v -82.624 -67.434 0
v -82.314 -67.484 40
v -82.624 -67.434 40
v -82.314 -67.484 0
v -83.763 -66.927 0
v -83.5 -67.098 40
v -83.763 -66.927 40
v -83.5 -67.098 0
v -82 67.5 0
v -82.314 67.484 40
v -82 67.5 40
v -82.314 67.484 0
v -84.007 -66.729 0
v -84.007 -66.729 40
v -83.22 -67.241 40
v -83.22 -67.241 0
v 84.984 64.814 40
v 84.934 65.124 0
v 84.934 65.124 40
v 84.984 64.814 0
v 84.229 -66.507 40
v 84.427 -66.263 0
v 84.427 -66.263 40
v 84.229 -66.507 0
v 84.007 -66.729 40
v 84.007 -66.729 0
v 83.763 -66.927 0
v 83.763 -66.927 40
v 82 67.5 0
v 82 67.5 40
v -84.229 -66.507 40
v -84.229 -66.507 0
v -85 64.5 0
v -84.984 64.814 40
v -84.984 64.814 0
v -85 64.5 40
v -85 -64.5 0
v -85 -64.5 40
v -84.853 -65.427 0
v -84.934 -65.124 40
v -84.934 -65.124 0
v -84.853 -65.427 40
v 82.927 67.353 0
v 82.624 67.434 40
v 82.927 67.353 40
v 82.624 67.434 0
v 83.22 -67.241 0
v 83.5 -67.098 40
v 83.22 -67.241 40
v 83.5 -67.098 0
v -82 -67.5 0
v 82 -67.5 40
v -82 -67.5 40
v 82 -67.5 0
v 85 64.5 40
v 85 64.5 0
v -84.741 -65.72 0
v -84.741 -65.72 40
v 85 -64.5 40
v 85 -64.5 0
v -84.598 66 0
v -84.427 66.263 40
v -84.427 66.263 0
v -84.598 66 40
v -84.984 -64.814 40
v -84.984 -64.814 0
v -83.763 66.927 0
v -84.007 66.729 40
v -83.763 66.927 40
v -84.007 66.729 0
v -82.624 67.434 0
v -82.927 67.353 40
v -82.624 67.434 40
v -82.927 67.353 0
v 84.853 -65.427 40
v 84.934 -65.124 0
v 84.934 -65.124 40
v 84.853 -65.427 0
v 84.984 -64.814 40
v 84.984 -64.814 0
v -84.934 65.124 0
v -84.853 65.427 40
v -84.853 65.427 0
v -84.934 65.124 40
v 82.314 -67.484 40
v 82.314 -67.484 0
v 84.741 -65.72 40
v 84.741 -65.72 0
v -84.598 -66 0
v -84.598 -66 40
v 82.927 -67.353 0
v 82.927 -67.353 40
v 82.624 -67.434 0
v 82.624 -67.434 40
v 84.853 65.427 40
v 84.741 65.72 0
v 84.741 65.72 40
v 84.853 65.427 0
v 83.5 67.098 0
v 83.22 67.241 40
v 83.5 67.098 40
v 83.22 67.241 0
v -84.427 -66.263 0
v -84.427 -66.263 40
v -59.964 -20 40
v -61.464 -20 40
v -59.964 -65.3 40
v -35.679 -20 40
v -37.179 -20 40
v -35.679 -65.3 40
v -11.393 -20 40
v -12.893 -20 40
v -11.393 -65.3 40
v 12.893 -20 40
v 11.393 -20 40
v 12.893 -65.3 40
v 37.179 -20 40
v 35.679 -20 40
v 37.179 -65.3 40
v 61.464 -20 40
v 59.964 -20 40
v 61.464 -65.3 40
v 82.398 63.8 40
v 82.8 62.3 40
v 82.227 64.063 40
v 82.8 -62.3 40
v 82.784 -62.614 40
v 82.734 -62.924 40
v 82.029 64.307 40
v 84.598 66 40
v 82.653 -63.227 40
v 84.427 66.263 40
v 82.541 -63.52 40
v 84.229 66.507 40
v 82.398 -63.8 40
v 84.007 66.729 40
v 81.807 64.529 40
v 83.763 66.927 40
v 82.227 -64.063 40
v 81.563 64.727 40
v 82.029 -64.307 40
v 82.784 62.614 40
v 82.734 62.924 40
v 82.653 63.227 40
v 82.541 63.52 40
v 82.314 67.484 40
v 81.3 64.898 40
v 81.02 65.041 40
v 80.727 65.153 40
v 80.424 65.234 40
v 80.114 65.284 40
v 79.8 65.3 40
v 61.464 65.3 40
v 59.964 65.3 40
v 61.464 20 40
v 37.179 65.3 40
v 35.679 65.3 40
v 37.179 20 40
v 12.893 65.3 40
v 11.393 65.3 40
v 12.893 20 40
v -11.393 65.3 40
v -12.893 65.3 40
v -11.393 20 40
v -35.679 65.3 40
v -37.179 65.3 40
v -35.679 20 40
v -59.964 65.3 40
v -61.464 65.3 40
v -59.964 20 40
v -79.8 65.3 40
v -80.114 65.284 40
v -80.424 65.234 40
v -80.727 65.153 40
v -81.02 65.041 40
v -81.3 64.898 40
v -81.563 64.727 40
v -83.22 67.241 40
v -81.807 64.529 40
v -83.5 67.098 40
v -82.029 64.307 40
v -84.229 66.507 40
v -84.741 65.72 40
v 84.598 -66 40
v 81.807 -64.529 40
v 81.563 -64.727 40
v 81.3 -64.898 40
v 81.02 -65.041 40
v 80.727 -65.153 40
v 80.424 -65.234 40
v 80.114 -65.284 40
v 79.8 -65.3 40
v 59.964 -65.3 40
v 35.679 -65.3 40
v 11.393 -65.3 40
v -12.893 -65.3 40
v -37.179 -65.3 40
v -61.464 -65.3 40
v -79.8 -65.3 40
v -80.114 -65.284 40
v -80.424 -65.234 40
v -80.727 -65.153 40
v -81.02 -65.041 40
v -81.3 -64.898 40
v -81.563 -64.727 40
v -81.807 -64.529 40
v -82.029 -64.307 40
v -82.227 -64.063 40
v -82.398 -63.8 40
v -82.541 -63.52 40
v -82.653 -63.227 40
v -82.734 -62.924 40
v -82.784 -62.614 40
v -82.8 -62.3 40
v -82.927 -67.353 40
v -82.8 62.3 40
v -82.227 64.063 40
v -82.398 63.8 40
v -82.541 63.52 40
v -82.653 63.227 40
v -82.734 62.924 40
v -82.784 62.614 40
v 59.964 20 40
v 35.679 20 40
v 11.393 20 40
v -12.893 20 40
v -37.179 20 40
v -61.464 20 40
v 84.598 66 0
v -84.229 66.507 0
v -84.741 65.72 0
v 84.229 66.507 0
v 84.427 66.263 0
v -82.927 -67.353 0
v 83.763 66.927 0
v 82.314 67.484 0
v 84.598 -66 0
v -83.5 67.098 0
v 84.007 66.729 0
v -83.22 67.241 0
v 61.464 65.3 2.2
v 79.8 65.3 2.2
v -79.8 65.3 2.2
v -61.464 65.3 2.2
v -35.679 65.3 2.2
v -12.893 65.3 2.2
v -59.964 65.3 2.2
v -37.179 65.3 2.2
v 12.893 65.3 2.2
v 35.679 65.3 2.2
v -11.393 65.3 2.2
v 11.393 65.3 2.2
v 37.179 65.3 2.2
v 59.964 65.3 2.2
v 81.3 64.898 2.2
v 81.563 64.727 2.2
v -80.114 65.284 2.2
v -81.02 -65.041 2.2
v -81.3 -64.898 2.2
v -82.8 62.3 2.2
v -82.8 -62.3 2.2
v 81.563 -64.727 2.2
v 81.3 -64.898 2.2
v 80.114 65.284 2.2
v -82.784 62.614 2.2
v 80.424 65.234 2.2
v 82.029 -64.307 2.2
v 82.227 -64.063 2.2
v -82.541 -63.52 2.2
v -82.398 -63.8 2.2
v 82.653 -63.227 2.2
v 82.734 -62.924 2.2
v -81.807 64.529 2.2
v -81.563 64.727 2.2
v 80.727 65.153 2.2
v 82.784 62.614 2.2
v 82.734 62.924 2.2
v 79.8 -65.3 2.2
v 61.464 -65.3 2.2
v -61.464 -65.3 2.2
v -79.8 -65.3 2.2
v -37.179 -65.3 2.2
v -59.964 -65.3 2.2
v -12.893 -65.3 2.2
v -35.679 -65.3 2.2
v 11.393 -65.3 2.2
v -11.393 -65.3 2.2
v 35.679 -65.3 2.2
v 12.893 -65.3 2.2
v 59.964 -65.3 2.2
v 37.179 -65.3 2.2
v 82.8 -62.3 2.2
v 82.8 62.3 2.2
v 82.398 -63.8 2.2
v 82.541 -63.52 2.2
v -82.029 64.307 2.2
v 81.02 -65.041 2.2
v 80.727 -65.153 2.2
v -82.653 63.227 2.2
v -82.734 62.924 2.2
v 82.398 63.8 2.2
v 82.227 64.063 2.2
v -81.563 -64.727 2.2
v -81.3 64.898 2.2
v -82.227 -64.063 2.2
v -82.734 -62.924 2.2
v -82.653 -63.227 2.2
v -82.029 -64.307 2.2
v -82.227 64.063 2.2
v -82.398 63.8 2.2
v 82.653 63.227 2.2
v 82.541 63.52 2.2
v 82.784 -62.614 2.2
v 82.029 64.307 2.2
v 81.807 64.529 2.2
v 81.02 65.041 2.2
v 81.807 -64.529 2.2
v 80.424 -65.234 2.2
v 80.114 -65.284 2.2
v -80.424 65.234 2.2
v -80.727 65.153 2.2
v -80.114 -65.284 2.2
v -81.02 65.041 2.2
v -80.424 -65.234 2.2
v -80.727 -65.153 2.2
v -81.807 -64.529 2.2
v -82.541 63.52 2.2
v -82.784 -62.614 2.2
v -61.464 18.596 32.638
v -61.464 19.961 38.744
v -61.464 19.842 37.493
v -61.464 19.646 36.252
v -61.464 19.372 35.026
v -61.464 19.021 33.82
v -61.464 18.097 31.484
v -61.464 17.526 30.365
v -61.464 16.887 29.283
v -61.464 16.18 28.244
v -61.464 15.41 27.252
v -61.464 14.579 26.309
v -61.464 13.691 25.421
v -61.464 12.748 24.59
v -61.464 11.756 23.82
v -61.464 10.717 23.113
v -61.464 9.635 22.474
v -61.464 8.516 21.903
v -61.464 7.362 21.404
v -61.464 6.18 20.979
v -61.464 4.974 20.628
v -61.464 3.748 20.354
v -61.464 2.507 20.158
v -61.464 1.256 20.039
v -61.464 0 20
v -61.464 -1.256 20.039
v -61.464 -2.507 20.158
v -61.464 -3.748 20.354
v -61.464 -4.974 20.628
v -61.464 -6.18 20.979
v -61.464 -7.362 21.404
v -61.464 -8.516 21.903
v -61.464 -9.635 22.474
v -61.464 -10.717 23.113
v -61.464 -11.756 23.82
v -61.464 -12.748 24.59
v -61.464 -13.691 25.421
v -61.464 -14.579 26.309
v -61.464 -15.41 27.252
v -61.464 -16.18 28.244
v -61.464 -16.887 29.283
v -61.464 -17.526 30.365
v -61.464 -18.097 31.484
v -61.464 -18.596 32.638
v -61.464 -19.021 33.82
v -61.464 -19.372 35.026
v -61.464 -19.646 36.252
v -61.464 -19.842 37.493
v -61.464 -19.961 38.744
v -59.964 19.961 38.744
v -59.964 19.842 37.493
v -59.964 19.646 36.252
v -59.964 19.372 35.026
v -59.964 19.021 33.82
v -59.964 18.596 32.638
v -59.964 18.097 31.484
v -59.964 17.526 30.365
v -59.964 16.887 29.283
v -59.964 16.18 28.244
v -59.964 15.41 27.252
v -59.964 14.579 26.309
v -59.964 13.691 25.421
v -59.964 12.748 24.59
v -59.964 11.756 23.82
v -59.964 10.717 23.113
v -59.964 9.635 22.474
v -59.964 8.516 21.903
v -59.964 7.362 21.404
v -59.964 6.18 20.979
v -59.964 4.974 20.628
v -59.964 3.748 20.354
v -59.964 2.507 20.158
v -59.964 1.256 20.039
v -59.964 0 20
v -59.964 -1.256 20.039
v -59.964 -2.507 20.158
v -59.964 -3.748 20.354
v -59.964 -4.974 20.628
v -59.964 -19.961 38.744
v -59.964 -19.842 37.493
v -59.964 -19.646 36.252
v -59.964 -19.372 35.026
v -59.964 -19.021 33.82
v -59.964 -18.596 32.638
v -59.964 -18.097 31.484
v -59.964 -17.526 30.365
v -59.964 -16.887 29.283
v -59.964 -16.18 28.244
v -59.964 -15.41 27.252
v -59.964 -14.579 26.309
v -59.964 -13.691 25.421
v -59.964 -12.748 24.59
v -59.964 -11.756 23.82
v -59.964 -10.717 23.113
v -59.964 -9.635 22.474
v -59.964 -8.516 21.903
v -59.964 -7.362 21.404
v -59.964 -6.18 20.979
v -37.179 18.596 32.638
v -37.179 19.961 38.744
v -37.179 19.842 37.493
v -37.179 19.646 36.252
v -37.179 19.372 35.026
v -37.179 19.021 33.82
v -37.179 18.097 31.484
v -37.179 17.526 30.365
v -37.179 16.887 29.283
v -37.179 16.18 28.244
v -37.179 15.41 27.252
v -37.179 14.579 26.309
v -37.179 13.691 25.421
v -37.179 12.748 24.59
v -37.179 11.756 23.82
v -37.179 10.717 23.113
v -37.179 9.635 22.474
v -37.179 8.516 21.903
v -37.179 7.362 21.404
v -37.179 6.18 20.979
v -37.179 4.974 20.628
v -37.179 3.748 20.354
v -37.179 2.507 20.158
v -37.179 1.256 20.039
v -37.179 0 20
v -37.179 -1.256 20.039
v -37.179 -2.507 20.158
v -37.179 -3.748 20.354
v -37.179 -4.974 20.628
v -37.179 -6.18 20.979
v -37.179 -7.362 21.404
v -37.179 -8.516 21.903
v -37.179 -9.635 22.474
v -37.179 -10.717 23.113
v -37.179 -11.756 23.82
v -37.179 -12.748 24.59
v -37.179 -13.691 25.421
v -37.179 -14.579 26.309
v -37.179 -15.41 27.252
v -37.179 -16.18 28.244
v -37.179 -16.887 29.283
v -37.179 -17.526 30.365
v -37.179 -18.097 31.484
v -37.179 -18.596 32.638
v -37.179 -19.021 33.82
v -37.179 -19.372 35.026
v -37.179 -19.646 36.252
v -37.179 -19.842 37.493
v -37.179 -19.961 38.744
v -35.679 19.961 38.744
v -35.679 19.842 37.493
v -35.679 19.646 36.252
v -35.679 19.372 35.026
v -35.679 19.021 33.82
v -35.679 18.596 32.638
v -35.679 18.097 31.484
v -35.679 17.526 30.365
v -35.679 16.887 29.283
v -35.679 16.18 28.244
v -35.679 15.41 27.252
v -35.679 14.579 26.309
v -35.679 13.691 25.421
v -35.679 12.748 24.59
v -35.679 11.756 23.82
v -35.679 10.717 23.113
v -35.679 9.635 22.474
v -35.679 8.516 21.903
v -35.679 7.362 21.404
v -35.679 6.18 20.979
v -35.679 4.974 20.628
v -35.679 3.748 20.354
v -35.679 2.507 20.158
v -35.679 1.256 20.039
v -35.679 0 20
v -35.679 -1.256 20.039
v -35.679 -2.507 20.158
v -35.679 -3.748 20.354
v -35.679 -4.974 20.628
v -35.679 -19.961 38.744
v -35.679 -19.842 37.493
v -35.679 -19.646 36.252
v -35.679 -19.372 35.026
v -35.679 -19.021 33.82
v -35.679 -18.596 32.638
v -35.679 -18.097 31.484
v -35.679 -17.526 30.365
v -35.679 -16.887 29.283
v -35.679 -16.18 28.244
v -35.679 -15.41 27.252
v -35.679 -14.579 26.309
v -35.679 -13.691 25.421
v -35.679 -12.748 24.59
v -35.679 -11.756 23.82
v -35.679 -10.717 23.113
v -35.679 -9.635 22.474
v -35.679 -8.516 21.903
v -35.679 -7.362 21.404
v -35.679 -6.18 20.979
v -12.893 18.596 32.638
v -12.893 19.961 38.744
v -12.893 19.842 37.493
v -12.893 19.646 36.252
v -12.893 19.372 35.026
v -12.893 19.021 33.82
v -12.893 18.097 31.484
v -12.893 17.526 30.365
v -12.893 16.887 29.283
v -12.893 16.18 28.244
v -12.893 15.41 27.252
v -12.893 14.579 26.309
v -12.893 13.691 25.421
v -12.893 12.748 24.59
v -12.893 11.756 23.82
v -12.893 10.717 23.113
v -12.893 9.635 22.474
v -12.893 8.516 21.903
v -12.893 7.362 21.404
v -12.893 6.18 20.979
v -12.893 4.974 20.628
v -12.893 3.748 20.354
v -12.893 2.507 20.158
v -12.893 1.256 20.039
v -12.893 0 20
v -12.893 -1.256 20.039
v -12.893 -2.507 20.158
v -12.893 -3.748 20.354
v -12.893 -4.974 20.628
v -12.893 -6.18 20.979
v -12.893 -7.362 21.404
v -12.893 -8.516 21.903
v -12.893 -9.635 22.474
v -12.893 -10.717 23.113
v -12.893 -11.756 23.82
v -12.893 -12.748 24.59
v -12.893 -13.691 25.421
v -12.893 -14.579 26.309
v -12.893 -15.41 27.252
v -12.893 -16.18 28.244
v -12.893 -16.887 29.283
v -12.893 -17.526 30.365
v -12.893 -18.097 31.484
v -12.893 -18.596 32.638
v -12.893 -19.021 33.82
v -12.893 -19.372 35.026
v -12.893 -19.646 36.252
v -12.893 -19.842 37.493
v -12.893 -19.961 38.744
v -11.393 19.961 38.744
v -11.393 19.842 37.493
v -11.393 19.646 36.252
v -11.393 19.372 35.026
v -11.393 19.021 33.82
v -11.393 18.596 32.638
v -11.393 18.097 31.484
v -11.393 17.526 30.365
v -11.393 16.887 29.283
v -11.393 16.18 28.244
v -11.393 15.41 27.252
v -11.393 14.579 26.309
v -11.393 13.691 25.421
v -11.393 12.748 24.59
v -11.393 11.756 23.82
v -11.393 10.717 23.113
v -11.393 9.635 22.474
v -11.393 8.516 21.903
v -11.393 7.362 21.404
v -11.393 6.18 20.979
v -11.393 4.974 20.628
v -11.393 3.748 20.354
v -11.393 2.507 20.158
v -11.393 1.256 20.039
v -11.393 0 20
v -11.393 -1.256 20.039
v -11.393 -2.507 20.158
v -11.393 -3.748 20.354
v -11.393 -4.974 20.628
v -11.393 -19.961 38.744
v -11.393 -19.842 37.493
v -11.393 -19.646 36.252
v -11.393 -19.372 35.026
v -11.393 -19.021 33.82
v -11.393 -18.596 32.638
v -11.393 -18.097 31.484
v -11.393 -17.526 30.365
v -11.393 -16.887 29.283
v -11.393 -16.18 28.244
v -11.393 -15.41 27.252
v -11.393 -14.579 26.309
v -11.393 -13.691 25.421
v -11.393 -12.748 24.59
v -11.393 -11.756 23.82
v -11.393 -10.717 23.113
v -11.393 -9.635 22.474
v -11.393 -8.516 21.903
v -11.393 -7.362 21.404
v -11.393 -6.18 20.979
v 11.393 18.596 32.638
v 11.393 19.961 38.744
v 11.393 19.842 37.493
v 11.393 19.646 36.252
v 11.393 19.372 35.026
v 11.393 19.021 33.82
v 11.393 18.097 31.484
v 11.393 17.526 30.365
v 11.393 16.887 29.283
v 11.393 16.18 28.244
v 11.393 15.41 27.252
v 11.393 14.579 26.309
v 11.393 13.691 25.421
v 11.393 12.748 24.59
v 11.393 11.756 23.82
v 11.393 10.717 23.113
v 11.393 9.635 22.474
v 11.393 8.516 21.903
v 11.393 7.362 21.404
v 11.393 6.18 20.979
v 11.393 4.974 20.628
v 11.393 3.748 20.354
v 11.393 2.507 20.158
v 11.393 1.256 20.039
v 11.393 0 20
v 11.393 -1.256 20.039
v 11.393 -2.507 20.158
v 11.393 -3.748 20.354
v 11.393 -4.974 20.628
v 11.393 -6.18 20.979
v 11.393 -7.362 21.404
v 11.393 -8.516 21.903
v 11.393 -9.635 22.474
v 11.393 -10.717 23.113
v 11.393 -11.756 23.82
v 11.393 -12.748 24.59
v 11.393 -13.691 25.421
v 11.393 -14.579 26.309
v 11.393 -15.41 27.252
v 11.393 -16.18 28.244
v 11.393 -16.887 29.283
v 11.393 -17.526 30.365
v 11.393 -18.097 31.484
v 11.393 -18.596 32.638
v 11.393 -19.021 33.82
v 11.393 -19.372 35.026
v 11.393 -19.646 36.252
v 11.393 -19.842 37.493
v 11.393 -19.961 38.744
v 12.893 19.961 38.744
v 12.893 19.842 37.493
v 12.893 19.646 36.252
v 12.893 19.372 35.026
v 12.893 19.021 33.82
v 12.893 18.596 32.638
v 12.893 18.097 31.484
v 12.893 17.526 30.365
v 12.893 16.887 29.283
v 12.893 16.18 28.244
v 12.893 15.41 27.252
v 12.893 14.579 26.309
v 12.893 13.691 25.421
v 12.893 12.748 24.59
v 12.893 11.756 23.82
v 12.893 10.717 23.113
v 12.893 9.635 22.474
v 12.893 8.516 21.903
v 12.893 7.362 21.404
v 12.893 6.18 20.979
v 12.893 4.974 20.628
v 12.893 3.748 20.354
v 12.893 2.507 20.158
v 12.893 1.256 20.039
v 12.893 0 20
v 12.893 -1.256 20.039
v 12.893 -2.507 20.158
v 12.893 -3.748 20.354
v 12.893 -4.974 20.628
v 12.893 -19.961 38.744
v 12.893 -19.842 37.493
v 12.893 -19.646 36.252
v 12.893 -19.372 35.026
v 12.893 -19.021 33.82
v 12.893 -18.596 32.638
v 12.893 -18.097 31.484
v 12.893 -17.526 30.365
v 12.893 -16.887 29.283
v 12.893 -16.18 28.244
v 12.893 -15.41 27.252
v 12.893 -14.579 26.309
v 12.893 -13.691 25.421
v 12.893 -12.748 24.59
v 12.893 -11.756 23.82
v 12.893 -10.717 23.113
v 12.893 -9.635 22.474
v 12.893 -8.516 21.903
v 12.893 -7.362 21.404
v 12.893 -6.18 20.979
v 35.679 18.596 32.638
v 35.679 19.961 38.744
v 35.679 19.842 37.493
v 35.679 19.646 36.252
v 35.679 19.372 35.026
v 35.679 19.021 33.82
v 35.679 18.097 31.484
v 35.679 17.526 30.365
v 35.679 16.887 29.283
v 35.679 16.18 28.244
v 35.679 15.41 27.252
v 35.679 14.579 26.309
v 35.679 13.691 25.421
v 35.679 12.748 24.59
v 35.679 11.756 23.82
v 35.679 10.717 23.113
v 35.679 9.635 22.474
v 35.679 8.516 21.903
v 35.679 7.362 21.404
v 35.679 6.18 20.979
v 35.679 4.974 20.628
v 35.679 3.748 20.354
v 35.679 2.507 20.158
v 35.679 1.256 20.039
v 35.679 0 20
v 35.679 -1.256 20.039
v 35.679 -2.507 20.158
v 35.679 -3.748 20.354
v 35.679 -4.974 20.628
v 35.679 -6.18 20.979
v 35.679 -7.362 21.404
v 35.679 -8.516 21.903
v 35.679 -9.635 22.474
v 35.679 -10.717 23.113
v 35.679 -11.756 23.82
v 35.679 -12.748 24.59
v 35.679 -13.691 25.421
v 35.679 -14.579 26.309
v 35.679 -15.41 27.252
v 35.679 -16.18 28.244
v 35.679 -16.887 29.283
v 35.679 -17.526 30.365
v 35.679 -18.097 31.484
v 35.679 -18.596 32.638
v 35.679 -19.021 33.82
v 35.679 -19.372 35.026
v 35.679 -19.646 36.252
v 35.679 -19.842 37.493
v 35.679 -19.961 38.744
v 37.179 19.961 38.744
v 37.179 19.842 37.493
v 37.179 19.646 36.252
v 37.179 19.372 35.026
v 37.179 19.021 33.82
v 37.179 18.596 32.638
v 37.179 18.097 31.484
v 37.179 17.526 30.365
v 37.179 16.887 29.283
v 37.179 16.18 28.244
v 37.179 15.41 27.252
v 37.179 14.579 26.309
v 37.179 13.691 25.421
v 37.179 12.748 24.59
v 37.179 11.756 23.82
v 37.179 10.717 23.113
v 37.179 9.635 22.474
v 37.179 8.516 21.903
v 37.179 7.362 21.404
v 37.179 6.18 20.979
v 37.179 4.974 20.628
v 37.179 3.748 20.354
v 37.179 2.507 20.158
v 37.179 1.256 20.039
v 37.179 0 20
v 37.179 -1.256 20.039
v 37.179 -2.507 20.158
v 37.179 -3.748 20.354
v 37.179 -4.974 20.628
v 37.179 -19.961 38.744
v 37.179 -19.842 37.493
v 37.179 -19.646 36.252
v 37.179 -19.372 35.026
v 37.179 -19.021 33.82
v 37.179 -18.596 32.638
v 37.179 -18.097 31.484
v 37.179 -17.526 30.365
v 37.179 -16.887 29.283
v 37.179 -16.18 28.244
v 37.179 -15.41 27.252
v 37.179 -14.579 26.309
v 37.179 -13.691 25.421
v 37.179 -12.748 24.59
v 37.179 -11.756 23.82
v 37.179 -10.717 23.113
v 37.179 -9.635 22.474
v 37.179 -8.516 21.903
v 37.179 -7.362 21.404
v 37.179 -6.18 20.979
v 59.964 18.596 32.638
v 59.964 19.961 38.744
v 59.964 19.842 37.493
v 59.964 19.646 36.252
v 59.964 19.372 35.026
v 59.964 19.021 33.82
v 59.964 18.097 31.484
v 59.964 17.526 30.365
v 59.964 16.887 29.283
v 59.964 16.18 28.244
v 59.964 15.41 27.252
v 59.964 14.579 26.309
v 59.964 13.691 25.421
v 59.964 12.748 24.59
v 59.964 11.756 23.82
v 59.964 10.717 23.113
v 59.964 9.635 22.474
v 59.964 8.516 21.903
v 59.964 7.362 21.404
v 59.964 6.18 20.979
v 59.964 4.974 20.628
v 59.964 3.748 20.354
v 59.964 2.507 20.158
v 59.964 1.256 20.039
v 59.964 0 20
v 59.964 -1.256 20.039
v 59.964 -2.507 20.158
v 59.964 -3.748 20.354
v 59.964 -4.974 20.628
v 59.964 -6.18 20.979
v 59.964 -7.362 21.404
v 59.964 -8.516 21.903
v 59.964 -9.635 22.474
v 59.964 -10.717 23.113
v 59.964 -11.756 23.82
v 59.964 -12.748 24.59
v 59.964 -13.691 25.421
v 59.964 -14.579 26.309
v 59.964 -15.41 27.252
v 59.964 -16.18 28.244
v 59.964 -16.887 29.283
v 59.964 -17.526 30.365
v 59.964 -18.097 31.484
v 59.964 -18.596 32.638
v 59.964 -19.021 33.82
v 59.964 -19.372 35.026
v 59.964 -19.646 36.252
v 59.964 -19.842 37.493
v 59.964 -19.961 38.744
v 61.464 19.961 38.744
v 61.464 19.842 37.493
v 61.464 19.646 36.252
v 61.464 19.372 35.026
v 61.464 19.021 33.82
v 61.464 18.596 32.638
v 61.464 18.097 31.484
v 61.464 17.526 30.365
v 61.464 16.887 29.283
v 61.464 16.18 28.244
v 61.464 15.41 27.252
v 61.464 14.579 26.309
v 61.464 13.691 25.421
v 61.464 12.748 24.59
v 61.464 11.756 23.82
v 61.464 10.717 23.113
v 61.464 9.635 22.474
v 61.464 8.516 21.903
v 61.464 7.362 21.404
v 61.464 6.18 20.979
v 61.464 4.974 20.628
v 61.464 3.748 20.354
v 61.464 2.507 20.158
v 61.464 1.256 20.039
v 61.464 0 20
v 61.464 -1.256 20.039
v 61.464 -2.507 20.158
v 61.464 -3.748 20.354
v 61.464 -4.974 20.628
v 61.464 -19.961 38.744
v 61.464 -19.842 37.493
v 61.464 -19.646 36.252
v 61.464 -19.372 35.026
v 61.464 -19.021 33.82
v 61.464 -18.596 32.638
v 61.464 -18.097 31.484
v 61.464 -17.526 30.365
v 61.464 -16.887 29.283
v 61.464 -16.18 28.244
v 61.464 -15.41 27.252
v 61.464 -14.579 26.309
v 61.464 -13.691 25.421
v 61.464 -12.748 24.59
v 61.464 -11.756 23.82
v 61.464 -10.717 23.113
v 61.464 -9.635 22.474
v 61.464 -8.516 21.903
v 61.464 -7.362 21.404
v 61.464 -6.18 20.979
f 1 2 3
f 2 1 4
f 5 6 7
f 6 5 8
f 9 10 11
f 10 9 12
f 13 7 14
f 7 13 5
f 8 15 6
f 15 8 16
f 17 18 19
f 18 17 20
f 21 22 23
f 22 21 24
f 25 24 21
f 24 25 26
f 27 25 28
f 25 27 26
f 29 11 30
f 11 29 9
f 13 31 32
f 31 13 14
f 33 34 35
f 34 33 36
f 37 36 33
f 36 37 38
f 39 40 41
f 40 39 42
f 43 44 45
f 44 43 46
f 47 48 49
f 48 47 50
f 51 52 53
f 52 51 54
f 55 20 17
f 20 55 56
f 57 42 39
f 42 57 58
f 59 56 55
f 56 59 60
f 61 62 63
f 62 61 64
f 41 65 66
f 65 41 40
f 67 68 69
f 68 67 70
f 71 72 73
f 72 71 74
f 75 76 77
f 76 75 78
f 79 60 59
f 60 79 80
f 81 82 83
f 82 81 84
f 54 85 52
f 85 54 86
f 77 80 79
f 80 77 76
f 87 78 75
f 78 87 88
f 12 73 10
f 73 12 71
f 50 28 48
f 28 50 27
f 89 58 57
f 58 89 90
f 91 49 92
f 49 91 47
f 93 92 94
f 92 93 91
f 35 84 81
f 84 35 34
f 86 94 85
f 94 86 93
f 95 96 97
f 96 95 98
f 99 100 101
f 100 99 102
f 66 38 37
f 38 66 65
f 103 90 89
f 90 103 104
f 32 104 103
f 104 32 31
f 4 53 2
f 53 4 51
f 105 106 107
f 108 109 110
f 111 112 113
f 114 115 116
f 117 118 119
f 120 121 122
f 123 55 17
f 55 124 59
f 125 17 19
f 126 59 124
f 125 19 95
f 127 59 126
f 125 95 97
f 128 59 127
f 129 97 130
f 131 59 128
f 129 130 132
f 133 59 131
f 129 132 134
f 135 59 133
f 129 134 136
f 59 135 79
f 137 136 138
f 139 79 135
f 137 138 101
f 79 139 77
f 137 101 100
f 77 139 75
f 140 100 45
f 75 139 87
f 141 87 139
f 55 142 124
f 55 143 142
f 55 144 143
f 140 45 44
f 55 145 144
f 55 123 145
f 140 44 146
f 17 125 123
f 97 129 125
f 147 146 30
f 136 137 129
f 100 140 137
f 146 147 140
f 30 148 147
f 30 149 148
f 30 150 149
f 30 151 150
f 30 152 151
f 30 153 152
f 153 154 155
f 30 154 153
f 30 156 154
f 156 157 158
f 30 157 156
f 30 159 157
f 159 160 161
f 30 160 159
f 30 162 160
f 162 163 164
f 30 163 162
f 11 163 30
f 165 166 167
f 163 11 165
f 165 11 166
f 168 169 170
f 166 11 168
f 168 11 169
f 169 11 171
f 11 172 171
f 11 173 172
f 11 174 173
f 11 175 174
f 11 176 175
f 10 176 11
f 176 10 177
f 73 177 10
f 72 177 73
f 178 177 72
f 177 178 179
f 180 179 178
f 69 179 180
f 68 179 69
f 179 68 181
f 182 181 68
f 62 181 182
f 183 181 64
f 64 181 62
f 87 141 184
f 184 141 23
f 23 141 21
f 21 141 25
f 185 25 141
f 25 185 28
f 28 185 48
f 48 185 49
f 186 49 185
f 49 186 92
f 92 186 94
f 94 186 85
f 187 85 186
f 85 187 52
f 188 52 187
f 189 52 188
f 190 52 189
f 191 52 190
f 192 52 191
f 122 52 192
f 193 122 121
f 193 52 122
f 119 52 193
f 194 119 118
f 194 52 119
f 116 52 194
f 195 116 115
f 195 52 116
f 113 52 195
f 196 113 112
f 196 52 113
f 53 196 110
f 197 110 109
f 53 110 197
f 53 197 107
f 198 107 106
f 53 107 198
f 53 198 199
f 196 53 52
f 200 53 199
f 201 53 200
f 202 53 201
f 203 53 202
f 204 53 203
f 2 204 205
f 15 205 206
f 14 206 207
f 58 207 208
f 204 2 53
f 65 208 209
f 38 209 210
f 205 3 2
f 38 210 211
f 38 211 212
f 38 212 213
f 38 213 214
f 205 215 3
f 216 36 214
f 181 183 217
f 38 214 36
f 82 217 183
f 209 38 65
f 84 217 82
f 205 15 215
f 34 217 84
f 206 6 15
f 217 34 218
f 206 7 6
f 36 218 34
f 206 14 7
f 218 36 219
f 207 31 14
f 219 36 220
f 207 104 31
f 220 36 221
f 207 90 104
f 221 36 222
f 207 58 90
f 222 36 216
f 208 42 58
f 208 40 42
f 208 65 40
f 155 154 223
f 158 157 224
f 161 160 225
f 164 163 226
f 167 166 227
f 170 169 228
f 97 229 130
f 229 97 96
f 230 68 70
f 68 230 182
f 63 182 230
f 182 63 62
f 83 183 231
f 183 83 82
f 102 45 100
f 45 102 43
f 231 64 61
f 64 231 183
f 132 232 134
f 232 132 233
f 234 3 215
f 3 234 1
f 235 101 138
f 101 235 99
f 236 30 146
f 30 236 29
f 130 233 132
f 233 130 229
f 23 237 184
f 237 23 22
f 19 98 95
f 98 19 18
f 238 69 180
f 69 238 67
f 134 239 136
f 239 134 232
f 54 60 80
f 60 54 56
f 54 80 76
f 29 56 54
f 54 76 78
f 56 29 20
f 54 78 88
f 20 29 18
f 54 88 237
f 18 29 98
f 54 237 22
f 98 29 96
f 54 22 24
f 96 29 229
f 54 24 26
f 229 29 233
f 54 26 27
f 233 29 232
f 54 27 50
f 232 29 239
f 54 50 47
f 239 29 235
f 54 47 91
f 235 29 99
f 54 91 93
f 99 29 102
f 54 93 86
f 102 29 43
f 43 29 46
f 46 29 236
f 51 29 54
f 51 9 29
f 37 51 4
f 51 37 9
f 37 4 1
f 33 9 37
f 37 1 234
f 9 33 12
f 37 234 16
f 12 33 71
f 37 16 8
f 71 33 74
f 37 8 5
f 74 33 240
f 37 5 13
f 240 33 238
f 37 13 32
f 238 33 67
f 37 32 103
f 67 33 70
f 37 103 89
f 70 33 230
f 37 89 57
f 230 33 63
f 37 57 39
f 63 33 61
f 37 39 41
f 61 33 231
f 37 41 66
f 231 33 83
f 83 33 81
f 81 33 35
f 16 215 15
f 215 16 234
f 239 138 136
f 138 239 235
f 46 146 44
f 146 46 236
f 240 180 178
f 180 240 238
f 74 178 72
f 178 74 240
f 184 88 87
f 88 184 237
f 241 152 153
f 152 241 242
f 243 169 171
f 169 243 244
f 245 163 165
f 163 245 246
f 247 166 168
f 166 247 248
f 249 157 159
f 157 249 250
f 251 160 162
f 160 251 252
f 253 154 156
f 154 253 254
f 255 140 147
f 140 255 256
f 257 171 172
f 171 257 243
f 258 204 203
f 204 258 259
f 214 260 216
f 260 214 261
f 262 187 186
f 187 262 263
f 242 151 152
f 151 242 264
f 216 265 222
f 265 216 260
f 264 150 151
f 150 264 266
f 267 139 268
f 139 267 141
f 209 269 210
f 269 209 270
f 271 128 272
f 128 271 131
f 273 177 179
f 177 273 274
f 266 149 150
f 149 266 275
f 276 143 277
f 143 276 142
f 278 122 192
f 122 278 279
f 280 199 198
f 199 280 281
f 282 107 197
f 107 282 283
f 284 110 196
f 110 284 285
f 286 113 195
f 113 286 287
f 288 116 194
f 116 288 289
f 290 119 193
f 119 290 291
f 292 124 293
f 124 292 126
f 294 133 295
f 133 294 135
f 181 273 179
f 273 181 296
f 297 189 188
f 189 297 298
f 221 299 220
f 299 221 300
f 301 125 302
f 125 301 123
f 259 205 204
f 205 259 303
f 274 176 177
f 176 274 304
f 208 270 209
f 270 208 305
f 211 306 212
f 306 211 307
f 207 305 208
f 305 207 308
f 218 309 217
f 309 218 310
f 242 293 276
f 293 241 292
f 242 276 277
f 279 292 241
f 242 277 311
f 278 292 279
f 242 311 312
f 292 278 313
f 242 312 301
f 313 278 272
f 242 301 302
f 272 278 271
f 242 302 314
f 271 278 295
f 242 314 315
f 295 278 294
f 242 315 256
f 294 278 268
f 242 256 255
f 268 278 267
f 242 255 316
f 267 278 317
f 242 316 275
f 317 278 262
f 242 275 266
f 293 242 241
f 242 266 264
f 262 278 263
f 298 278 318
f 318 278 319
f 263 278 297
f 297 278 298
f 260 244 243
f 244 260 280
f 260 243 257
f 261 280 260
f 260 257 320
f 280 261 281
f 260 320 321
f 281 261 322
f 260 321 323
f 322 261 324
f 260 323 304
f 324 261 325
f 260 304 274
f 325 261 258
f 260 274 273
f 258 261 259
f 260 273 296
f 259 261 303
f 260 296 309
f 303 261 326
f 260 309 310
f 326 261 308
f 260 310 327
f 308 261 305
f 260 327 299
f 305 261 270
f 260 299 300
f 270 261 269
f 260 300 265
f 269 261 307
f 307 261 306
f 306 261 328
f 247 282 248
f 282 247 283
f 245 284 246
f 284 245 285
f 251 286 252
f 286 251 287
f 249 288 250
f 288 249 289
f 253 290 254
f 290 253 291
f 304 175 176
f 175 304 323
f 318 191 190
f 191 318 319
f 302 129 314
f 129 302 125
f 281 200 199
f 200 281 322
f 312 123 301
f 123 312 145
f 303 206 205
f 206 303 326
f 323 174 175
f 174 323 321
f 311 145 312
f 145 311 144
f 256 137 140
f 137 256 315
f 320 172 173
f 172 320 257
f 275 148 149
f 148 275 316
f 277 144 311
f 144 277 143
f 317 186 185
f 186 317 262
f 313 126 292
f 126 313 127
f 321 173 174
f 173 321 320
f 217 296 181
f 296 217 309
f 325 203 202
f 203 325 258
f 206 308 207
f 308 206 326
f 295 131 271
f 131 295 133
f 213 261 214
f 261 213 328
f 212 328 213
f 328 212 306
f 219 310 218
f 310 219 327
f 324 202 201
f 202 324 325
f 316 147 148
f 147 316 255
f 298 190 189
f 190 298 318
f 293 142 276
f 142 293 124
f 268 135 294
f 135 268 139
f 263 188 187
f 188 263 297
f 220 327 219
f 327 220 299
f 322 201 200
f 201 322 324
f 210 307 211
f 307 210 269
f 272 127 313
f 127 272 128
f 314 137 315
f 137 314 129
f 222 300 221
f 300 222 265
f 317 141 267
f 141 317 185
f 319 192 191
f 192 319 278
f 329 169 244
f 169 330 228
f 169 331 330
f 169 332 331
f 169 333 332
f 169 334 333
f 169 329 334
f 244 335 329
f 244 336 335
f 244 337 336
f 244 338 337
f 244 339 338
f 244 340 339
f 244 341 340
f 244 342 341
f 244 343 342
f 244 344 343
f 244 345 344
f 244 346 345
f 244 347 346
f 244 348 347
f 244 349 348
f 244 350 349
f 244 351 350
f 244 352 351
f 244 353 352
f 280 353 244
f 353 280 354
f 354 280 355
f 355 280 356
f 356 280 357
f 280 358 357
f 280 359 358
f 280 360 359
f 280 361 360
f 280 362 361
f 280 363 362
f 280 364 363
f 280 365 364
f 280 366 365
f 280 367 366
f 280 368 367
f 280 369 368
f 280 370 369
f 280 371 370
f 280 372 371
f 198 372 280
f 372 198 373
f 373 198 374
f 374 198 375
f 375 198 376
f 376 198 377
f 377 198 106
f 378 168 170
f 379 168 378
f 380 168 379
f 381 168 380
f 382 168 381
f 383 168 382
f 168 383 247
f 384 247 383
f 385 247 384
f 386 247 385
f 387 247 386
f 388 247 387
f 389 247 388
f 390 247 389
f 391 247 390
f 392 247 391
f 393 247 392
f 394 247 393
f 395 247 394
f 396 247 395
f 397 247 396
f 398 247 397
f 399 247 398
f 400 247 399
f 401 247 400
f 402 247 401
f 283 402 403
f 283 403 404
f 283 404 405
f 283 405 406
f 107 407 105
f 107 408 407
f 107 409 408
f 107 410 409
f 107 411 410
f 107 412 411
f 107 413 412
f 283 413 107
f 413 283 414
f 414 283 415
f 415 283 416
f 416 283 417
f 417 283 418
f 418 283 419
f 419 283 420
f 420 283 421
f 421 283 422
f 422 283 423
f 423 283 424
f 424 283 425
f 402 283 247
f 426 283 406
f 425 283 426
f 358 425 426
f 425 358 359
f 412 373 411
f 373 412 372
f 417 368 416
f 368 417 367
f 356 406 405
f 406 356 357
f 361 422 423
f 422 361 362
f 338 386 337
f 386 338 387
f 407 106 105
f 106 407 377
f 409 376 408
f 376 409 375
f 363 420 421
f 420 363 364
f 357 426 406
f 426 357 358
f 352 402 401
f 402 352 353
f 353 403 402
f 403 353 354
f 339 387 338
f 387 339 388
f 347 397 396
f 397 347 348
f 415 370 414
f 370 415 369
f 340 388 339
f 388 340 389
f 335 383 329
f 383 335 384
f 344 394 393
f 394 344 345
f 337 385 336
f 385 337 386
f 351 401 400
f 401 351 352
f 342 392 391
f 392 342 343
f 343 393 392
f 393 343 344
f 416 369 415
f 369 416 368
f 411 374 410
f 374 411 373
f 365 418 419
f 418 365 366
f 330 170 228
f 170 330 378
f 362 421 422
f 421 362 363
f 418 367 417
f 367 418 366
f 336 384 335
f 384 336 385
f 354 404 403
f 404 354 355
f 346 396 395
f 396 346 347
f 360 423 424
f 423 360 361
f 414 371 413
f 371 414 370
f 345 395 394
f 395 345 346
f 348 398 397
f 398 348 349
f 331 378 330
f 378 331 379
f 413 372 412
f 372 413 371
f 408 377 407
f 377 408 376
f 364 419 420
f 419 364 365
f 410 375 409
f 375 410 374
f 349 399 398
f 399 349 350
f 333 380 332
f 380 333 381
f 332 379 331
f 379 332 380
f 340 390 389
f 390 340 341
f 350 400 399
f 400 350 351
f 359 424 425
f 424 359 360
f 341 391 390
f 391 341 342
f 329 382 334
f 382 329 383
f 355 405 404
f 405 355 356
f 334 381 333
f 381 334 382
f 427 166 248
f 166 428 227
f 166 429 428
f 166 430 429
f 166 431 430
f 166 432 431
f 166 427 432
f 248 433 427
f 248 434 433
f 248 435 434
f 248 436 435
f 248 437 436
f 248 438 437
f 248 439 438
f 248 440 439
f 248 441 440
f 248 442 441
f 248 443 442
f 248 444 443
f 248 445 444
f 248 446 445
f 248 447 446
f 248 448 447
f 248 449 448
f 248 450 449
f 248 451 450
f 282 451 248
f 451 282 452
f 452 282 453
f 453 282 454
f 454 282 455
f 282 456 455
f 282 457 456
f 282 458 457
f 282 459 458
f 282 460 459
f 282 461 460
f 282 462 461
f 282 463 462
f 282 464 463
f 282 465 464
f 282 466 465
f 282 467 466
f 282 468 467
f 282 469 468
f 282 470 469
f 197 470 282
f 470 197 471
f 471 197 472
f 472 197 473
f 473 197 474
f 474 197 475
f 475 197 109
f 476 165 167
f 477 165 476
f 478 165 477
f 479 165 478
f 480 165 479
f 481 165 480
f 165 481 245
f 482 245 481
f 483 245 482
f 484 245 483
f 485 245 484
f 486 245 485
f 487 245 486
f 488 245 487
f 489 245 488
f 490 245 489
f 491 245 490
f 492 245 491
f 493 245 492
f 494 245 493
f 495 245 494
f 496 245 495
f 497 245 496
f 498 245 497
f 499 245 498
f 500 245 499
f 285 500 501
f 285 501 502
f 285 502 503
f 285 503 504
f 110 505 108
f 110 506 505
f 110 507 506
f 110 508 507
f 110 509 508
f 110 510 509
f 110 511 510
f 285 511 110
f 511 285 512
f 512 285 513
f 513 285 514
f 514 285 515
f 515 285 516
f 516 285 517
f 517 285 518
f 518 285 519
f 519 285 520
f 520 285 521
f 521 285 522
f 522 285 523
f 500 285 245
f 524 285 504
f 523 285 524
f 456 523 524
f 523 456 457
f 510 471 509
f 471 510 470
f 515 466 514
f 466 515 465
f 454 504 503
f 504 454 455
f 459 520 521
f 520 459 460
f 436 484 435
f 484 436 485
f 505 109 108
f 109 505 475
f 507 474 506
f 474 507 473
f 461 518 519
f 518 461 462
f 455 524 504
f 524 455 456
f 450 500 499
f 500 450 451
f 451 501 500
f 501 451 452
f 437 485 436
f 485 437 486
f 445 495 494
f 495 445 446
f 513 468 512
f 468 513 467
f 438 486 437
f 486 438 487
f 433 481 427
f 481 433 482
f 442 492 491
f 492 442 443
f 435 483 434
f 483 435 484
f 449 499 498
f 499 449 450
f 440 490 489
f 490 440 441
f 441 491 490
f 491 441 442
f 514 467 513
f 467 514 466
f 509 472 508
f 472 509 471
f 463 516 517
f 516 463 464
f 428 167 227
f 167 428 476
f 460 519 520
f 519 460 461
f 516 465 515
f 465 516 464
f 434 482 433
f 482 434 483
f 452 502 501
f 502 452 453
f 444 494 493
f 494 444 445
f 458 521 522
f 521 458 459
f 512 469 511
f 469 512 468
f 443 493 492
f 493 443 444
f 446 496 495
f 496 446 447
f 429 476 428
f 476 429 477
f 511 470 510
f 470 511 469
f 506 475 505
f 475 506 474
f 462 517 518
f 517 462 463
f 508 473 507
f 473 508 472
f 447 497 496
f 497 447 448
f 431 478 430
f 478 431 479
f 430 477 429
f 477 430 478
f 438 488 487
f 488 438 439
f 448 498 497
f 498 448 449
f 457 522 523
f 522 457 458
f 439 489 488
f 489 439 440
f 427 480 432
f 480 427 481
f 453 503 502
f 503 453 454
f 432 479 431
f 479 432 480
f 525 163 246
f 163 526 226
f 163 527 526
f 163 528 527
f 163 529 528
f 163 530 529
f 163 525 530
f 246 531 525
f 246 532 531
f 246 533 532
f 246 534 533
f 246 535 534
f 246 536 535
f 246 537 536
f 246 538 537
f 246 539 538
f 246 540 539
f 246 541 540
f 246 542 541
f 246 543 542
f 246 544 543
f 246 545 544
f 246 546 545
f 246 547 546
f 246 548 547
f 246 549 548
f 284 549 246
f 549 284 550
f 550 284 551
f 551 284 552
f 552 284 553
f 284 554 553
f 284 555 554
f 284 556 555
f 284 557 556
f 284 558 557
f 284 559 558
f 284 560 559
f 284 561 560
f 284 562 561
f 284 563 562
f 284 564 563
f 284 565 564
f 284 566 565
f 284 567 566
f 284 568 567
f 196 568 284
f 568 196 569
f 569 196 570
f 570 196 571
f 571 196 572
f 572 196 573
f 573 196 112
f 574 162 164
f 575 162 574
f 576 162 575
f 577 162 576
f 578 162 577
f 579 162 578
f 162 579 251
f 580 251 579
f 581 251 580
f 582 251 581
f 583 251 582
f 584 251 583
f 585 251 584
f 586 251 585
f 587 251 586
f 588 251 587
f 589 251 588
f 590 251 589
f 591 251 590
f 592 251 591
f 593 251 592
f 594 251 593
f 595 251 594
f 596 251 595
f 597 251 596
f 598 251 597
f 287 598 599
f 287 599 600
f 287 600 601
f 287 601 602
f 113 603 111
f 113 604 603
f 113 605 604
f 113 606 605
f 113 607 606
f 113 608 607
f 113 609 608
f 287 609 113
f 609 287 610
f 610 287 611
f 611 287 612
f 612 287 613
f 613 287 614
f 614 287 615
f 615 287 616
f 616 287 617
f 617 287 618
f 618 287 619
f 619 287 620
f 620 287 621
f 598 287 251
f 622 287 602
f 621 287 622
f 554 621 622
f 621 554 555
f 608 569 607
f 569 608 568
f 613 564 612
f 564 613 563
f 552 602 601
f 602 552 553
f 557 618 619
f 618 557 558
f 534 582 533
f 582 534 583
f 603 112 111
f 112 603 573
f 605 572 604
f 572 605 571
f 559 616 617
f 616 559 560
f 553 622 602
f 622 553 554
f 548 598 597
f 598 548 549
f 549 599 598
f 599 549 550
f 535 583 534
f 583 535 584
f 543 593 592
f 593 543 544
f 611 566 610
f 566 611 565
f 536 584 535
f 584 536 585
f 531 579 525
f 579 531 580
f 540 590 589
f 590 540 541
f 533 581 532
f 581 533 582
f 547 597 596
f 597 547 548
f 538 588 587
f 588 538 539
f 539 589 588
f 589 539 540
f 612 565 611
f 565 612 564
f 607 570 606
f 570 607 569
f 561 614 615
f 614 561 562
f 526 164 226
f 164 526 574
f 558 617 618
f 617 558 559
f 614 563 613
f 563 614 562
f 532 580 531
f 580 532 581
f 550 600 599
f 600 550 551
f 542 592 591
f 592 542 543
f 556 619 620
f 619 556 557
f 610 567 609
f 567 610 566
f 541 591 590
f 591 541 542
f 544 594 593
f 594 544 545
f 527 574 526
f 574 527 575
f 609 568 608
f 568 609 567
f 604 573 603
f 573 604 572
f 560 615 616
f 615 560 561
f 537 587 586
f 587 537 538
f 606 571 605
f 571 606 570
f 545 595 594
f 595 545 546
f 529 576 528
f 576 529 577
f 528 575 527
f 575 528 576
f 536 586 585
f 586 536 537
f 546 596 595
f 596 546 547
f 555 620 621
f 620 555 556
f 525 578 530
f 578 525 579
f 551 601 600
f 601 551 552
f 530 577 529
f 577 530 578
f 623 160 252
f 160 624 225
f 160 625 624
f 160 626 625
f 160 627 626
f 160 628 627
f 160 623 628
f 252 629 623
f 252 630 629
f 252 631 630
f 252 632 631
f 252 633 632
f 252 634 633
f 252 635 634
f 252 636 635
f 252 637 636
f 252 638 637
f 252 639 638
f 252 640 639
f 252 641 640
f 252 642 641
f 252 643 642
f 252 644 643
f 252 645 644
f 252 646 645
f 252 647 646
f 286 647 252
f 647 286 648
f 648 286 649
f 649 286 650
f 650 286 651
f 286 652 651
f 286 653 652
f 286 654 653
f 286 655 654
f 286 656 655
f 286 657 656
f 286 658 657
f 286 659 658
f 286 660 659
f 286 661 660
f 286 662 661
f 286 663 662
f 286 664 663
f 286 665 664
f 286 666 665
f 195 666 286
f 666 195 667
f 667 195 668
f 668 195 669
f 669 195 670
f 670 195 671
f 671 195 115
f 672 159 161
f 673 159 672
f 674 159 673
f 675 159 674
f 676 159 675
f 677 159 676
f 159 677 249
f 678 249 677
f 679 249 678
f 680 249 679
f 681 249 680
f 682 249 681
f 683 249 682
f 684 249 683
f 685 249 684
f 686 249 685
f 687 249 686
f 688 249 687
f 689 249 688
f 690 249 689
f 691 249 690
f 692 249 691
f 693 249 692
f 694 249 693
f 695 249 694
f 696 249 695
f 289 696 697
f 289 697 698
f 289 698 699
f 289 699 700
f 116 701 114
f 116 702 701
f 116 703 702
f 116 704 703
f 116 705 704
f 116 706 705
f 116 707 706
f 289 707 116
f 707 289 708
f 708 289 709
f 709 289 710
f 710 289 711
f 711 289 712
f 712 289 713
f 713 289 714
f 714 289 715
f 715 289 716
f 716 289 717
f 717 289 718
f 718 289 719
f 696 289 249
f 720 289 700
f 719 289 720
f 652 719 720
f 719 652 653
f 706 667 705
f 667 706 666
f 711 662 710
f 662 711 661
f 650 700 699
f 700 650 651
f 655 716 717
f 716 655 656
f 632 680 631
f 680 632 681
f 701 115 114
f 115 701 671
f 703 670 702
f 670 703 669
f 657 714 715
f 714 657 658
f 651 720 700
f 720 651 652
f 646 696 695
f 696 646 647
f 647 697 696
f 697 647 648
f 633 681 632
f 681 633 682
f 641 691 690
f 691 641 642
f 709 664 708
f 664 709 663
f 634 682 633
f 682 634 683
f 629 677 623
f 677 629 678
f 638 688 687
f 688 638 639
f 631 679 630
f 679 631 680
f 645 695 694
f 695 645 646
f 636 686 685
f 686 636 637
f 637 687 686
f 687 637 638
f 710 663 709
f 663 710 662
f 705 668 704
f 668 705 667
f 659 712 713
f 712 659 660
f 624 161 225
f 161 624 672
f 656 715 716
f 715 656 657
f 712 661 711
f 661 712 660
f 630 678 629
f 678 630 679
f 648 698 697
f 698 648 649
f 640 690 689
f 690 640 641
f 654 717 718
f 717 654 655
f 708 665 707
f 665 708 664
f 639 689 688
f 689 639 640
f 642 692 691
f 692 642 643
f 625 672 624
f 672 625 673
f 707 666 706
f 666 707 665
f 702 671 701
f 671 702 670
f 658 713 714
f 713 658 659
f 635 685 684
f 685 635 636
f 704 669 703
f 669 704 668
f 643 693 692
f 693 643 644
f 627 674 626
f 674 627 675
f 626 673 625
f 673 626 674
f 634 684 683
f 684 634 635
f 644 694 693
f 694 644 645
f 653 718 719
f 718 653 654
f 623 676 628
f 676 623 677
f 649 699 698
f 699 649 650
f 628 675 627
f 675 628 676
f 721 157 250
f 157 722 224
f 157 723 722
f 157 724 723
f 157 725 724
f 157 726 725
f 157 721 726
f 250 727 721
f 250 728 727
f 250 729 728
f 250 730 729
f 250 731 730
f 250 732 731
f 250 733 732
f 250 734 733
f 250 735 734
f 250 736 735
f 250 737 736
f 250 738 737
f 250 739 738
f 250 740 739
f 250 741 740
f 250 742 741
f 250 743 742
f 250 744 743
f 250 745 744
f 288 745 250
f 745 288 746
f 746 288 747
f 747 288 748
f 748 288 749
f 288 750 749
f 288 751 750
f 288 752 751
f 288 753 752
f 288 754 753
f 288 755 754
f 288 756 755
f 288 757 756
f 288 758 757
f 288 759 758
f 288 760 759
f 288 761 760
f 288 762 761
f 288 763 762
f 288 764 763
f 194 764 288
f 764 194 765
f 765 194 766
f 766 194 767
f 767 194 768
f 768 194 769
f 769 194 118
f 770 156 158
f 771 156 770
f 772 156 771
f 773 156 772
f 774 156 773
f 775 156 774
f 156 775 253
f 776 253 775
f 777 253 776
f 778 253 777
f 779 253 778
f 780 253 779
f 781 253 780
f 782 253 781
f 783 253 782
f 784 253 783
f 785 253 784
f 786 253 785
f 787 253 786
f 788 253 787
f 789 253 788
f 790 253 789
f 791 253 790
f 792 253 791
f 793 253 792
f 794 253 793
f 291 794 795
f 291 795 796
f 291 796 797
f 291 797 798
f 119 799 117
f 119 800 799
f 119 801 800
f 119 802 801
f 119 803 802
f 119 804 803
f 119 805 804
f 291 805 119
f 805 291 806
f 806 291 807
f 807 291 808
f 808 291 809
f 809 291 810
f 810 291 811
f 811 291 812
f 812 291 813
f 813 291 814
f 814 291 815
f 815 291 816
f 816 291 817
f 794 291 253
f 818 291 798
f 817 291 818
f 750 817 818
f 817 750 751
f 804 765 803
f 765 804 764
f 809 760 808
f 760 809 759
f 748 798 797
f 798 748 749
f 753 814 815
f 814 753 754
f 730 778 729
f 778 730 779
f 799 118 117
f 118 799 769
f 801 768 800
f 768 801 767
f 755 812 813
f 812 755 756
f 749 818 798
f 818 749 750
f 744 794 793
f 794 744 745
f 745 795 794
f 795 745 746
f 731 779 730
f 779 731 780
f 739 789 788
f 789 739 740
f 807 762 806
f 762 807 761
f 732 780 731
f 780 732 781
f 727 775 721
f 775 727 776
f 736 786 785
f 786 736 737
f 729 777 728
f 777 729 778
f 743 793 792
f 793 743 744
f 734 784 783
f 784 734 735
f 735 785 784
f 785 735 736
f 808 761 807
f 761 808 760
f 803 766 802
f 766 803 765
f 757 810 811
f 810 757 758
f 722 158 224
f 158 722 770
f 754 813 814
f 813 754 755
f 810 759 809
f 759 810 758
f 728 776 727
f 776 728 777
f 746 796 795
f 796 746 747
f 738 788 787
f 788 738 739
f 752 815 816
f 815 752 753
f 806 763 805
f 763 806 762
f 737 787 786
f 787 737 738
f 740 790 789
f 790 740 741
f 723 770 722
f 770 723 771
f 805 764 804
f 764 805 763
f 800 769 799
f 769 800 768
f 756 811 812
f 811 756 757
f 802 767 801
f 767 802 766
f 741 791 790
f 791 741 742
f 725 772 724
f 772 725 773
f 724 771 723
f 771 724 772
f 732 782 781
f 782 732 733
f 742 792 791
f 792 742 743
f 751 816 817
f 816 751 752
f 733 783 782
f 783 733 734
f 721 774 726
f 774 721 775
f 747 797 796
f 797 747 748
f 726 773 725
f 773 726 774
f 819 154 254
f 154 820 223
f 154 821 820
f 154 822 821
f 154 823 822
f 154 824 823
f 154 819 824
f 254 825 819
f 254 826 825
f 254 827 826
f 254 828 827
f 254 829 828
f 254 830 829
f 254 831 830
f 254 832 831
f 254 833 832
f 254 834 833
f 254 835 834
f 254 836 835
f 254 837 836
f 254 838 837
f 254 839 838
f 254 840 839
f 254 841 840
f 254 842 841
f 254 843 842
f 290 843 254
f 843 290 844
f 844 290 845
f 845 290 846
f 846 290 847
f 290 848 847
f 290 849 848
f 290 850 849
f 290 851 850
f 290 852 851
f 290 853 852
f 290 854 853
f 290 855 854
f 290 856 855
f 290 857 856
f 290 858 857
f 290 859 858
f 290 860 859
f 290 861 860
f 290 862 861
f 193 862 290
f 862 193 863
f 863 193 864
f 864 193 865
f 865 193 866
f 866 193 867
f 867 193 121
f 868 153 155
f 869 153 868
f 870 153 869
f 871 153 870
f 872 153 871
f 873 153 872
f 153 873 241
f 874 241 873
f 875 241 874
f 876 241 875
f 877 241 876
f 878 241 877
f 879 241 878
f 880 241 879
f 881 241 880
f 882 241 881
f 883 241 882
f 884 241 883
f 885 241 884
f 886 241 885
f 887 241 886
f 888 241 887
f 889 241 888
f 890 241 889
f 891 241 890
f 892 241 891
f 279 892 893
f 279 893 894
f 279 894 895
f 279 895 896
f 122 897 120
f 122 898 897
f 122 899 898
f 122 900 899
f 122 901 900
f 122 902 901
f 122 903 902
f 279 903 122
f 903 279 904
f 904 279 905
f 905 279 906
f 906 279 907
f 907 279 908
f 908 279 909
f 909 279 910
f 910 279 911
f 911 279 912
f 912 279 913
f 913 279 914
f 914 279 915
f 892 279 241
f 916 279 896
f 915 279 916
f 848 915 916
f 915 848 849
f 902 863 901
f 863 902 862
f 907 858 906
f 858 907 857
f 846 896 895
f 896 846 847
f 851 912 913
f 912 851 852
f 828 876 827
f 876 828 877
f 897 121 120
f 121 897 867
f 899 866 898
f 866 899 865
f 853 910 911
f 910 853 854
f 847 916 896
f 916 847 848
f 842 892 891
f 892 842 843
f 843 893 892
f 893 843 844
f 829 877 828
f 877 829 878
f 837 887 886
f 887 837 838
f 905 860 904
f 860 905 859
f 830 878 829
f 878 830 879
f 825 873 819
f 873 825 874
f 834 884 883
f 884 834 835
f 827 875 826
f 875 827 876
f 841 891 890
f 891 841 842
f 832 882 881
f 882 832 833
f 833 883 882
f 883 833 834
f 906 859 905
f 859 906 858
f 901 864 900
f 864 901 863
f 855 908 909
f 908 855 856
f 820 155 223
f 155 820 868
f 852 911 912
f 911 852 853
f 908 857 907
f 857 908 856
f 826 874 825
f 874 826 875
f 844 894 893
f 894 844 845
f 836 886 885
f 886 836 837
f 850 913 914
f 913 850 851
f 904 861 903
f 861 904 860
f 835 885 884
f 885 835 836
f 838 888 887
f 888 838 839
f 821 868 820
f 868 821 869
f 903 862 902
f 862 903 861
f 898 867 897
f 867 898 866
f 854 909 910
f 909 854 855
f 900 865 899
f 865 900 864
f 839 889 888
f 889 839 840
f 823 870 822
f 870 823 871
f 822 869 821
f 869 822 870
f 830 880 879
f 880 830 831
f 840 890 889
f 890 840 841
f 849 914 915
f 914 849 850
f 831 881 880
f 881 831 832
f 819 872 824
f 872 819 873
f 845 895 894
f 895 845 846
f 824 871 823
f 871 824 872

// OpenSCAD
// Box width
boxWidth = 170; 

// Box depth
boxDepth = 135; 

// Box height
boxHeight = 40; 

// Lid height
lidHeight = 10; 

// Round corners
roundCorner=3; // [0.01:No, 3:Yes]

// Wall thickness
wallThickness=2.2; 

// Text on base (empty to remove)
textBase = "";

// Base text size
textBaseSize = 7; // [3:50]

// Text on lid (empty to remove)
textLid = "";

// Lid text size
textLidSize = 8; // [3:50]

// Number of vertical spaces
numSeparatorsX = 7; // [1:20]

// Number of horizontal spaces
numSeparatorsY = 1; // [1:20]

// Parts to show
showParts = 1; // [0:All, 1:Base, 2:Lid]

// Just for presentation purposes
showClosed = 0; // [0:Open, 1:Closed]

// Size of cut out dependable on box size. 0.5 is half of height. 0 to remove
cutOutSize = 0.5;


/* [Hidden] */
$fn=60;
tolerance = 0.8;
iw = 1.5;

if( showParts != 2 || showClosed ==1) {
    boxBase();
    separators(numSeparatorsX, numSeparatorsY, boxWidth, boxDepth, boxHeight);
}
if (showClosed == 1 ) {
    translate([0, 0, boxHeight]) rotate(a=[180, 0, 0]) boxLid();
}
else {
    if (showParts != 1) translate([boxWidth + 5, 0, 0]) boxLid();
}

module separators (nx, ny, w, d, h) {
    xS = w / nx;
    yS = d/ ny;
    union(){
        if ( nx > 1) {
            for ( a = [0 : nx-2] ) {
                                    difference() {
                translate([-w/2+xS*(a+1), 0, 0])

                        linear_extrude(height=h)
                        square([iw, d-2*wallThickness], center = true);
                        translate([-w/2+xS*(a+1), 0, h])
                        rotate ([0,90,0]) cylinder (4, h*cutOutSize, h*cutOutSize, center = true, $fn=100);
                    }
            }
        }
        if ( ny > 1) {
            for ( b = [0 : ny-2] ) {
                translate([0, -d/2+yS*(b+1), 0])
                    linear_extrude(height=h)
                    square([w-2*wallThickness, iw], center = true);
            }
        }
    }

}

module boxLid() {
    difference() {
        roundedCube(boxWidth+2*(tolerance+wallThickness), boxDepth+2*(tolerance+wallThickness), lidHeight, roundCorner);
             
        translate([0, 0, wallThickness]) roundedCube(boxWidth+2*tolerance, boxDepth+2*tolerance, lidHeight, roundCorner);
        
        translate([0, 0, 0.5]) rotate(a=[180, 0, 0]) linear_extrude(height=2) text(textLid, valign="center", halign="center", font="Arial", size=textLidSize);
    }
}

module boxBase() {
    difference() {
        roundedCube(boxWidth, boxDepth, boxHeight, roundCorner);
        translate([0, 0, wallThickness]) roundedCube(boxWidth-2*wallThickness, boxDepth-2*wallThickness, boxHeight, roundCorner);
        
        translate([0, -boxDepth/2+0.5, boxHeight/2]) rotate(a=[90, 0, 0]) linear_extrude(height=2) text(textBase, valign="center", halign="center", font="Arial", size=textBaseSize);
    }
}

module roundedCube (w, d, h, r) {
    hull() {
        translate([-w/2+r, -d/2+r, 0]) cylinder(r=r, h=h);
        translate([-w/2+r, d/2-r, 0]) cylinder(r=r, h=h);    
        translate([w/2-r, -d/2+r, 0]) cylinder(r=r, h=h);
        translate([w/2-r, d/2-r, 0]) cylinder(r=r, h=h);
    }
}
